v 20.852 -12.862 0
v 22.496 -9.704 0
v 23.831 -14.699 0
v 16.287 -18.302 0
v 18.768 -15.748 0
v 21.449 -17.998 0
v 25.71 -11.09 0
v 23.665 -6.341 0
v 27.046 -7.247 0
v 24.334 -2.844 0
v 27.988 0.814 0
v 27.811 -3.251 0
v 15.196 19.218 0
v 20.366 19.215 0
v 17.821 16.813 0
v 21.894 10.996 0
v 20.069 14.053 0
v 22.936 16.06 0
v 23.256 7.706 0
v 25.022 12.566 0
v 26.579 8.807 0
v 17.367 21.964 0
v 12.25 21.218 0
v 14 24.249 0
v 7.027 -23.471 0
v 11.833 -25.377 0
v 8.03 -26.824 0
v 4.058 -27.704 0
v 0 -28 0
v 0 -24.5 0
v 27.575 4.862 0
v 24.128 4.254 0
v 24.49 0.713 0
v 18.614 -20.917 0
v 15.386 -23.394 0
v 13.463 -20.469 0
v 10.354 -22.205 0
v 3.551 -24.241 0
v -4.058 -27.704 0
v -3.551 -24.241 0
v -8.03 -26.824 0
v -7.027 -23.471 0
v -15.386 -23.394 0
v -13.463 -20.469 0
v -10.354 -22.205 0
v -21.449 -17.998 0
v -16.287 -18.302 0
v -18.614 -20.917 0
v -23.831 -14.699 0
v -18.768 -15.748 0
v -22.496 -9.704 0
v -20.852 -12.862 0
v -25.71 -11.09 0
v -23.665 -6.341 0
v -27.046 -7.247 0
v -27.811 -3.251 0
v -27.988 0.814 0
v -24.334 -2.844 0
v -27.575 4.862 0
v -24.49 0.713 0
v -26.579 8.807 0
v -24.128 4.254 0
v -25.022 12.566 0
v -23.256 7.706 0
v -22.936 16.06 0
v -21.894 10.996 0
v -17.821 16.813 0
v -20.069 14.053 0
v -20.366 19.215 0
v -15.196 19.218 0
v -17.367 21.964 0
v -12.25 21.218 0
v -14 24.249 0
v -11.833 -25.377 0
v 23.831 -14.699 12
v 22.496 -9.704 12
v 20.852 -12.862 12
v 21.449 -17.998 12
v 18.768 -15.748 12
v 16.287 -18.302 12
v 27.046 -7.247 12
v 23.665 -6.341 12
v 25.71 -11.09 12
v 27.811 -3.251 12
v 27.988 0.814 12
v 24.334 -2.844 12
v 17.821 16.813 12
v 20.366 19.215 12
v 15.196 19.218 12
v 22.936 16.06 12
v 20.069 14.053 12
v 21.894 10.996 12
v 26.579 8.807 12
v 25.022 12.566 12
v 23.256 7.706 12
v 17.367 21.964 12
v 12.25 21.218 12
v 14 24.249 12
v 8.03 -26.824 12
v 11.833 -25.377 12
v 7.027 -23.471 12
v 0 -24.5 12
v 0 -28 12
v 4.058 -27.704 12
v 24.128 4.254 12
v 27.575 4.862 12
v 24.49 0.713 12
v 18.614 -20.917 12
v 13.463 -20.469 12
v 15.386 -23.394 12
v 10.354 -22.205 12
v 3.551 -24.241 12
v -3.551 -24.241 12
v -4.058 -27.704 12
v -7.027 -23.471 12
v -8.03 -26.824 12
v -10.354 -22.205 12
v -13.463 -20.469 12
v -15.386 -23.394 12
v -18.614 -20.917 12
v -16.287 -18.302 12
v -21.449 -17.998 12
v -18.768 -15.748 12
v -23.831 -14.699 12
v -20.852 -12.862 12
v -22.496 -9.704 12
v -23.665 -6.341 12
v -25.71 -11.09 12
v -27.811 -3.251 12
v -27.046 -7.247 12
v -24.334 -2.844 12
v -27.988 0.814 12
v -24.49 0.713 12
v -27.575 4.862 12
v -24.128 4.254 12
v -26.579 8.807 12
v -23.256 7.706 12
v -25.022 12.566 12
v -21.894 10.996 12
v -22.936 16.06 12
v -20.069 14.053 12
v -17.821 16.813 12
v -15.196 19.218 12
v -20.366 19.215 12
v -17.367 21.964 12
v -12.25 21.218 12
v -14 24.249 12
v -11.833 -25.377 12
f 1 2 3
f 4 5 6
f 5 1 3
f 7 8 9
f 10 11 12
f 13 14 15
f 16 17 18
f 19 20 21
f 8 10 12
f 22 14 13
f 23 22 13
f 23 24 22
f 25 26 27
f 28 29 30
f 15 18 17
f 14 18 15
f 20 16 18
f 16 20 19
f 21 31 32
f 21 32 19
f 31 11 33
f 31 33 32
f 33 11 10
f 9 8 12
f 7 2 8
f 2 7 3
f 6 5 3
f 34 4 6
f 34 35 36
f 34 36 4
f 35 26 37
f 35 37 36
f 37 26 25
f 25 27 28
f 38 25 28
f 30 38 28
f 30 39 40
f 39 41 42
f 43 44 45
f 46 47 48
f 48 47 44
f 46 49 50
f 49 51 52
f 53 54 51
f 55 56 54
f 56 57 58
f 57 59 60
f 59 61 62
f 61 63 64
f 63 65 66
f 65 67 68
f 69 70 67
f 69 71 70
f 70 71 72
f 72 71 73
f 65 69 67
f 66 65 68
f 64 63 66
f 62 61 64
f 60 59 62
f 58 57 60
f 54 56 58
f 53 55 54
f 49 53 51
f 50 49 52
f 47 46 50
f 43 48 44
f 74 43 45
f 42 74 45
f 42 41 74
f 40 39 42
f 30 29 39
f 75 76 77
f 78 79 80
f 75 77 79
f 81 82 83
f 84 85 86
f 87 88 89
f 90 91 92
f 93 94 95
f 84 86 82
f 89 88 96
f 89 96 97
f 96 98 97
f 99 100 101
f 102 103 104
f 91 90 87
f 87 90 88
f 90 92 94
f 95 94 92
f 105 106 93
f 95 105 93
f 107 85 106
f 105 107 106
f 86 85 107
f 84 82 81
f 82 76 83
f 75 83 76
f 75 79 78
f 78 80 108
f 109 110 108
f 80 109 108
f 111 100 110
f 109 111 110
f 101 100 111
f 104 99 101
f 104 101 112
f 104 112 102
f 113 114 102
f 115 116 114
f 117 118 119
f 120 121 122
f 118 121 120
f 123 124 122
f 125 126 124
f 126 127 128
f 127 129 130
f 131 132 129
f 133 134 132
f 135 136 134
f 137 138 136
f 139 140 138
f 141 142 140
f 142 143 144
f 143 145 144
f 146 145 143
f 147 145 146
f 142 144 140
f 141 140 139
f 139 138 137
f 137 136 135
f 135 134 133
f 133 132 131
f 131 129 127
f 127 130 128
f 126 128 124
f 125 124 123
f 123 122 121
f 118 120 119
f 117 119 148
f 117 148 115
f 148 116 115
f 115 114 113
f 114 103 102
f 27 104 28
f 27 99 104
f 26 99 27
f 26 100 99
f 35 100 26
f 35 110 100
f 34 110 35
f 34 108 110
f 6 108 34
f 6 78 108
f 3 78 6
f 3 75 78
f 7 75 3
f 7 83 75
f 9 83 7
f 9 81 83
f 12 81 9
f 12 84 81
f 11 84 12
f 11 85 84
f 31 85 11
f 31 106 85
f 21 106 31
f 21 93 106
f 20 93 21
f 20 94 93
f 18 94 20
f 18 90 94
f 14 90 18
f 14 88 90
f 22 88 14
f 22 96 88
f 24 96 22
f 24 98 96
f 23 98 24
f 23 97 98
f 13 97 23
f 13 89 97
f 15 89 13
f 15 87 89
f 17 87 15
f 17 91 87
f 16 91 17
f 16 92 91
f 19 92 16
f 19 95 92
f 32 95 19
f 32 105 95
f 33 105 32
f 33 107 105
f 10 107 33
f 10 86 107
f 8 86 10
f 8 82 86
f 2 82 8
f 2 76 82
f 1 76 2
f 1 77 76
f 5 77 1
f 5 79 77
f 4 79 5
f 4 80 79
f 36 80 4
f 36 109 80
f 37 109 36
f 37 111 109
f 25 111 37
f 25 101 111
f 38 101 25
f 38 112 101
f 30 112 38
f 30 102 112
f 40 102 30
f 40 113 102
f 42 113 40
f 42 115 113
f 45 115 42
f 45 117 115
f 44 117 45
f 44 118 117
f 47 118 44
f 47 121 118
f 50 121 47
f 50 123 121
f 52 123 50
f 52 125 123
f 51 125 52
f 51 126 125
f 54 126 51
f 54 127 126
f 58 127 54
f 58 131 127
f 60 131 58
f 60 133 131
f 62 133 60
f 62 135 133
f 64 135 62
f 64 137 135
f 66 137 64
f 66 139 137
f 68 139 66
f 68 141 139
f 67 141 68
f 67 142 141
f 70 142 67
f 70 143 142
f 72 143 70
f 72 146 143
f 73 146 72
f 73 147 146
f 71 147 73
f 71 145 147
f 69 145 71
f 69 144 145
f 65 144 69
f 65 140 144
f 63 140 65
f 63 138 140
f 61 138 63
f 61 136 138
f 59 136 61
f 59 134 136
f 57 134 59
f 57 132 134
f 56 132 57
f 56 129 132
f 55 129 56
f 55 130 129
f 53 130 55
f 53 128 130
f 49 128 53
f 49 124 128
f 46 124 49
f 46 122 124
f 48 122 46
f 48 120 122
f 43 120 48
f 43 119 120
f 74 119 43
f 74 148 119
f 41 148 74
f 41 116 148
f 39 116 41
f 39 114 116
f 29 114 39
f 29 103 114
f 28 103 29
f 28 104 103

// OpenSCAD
$fn = 32;

// ----------------------------------------------------------------------
// Spring clip: 56 mm outside, 3.5 mm band, 60 degree opening
// ----------------------------------------------------------------------

// --- parameters (mm) ---
outer_r = 28;             // clip outside radius
inner_r = 24.5;           // clip bore radius
band = 3.5;               // band thickness
clip_w = 12;              // clip width
opening = 60;             // opening angle

clip_profile = [[-14, 24.249], [-17.367, 21.964], [-20.366, 19.215], [-22.936, 16.06], [-25.022, 12.566], [-26.579, 8.807], [-27.575, 4.862], [-27.988, 0.814], [-27.811, -3.251], [-27.046, -7.247], [-25.71, -11.09], [-23.831, -14.699], [-21.449, -17.998], [-18.614, -20.917], [-15.386, -23.394], [-11.833, -25.377], [-8.03, -26.824], [-4.058, -27.704], [0, -28], [4.058, -27.704], [8.03, -26.824], [11.833, -25.377], [15.386, -23.394], [18.614, -20.917], [21.449, -17.998], [23.831, -14.699], [25.71, -11.09], [27.046, -7.247], [27.811, -3.251], [27.988, 0.814], [27.575, 4.862], [26.579, 8.807], [25.022, 12.566], [22.936, 16.06], [20.366, 19.215], [17.367, 21.964], [14, 24.249], [12.25, 21.218], [15.196, 19.218], [17.821, 16.813], [20.069, 14.053], [21.894, 10.996], [23.256, 7.706], [24.128, 4.254], [24.49, 0.713], [24.334, -2.844], [23.665, -6.341], [22.496, -9.704], [20.852, -12.862], [18.768, -15.748], [16.287, -18.302], [13.463, -20.469], [10.354, -22.205], [7.027, -23.471], [3.551, -24.241], [0, -24.5], [-3.551, -24.241], [-7.027, -23.471], [-10.354, -22.205], [-13.463, -20.469], [-16.287, -18.302], [-18.768, -15.748], [-20.852, -12.862], [-22.496, -9.704], [-23.665, -6.341], [-24.334, -2.844], [-24.49, 0.713], [-24.128, 4.254], [-23.256, 7.706], [-21.894, 10.996], [-20.069, 14.053], [-17.821, 16.813], [-15.196, 19.218], [-12.25, 21.218]];

difference() {
  union() {
    linear_extrude(height = clip_w) polygon(clip_profile);
  }
}
